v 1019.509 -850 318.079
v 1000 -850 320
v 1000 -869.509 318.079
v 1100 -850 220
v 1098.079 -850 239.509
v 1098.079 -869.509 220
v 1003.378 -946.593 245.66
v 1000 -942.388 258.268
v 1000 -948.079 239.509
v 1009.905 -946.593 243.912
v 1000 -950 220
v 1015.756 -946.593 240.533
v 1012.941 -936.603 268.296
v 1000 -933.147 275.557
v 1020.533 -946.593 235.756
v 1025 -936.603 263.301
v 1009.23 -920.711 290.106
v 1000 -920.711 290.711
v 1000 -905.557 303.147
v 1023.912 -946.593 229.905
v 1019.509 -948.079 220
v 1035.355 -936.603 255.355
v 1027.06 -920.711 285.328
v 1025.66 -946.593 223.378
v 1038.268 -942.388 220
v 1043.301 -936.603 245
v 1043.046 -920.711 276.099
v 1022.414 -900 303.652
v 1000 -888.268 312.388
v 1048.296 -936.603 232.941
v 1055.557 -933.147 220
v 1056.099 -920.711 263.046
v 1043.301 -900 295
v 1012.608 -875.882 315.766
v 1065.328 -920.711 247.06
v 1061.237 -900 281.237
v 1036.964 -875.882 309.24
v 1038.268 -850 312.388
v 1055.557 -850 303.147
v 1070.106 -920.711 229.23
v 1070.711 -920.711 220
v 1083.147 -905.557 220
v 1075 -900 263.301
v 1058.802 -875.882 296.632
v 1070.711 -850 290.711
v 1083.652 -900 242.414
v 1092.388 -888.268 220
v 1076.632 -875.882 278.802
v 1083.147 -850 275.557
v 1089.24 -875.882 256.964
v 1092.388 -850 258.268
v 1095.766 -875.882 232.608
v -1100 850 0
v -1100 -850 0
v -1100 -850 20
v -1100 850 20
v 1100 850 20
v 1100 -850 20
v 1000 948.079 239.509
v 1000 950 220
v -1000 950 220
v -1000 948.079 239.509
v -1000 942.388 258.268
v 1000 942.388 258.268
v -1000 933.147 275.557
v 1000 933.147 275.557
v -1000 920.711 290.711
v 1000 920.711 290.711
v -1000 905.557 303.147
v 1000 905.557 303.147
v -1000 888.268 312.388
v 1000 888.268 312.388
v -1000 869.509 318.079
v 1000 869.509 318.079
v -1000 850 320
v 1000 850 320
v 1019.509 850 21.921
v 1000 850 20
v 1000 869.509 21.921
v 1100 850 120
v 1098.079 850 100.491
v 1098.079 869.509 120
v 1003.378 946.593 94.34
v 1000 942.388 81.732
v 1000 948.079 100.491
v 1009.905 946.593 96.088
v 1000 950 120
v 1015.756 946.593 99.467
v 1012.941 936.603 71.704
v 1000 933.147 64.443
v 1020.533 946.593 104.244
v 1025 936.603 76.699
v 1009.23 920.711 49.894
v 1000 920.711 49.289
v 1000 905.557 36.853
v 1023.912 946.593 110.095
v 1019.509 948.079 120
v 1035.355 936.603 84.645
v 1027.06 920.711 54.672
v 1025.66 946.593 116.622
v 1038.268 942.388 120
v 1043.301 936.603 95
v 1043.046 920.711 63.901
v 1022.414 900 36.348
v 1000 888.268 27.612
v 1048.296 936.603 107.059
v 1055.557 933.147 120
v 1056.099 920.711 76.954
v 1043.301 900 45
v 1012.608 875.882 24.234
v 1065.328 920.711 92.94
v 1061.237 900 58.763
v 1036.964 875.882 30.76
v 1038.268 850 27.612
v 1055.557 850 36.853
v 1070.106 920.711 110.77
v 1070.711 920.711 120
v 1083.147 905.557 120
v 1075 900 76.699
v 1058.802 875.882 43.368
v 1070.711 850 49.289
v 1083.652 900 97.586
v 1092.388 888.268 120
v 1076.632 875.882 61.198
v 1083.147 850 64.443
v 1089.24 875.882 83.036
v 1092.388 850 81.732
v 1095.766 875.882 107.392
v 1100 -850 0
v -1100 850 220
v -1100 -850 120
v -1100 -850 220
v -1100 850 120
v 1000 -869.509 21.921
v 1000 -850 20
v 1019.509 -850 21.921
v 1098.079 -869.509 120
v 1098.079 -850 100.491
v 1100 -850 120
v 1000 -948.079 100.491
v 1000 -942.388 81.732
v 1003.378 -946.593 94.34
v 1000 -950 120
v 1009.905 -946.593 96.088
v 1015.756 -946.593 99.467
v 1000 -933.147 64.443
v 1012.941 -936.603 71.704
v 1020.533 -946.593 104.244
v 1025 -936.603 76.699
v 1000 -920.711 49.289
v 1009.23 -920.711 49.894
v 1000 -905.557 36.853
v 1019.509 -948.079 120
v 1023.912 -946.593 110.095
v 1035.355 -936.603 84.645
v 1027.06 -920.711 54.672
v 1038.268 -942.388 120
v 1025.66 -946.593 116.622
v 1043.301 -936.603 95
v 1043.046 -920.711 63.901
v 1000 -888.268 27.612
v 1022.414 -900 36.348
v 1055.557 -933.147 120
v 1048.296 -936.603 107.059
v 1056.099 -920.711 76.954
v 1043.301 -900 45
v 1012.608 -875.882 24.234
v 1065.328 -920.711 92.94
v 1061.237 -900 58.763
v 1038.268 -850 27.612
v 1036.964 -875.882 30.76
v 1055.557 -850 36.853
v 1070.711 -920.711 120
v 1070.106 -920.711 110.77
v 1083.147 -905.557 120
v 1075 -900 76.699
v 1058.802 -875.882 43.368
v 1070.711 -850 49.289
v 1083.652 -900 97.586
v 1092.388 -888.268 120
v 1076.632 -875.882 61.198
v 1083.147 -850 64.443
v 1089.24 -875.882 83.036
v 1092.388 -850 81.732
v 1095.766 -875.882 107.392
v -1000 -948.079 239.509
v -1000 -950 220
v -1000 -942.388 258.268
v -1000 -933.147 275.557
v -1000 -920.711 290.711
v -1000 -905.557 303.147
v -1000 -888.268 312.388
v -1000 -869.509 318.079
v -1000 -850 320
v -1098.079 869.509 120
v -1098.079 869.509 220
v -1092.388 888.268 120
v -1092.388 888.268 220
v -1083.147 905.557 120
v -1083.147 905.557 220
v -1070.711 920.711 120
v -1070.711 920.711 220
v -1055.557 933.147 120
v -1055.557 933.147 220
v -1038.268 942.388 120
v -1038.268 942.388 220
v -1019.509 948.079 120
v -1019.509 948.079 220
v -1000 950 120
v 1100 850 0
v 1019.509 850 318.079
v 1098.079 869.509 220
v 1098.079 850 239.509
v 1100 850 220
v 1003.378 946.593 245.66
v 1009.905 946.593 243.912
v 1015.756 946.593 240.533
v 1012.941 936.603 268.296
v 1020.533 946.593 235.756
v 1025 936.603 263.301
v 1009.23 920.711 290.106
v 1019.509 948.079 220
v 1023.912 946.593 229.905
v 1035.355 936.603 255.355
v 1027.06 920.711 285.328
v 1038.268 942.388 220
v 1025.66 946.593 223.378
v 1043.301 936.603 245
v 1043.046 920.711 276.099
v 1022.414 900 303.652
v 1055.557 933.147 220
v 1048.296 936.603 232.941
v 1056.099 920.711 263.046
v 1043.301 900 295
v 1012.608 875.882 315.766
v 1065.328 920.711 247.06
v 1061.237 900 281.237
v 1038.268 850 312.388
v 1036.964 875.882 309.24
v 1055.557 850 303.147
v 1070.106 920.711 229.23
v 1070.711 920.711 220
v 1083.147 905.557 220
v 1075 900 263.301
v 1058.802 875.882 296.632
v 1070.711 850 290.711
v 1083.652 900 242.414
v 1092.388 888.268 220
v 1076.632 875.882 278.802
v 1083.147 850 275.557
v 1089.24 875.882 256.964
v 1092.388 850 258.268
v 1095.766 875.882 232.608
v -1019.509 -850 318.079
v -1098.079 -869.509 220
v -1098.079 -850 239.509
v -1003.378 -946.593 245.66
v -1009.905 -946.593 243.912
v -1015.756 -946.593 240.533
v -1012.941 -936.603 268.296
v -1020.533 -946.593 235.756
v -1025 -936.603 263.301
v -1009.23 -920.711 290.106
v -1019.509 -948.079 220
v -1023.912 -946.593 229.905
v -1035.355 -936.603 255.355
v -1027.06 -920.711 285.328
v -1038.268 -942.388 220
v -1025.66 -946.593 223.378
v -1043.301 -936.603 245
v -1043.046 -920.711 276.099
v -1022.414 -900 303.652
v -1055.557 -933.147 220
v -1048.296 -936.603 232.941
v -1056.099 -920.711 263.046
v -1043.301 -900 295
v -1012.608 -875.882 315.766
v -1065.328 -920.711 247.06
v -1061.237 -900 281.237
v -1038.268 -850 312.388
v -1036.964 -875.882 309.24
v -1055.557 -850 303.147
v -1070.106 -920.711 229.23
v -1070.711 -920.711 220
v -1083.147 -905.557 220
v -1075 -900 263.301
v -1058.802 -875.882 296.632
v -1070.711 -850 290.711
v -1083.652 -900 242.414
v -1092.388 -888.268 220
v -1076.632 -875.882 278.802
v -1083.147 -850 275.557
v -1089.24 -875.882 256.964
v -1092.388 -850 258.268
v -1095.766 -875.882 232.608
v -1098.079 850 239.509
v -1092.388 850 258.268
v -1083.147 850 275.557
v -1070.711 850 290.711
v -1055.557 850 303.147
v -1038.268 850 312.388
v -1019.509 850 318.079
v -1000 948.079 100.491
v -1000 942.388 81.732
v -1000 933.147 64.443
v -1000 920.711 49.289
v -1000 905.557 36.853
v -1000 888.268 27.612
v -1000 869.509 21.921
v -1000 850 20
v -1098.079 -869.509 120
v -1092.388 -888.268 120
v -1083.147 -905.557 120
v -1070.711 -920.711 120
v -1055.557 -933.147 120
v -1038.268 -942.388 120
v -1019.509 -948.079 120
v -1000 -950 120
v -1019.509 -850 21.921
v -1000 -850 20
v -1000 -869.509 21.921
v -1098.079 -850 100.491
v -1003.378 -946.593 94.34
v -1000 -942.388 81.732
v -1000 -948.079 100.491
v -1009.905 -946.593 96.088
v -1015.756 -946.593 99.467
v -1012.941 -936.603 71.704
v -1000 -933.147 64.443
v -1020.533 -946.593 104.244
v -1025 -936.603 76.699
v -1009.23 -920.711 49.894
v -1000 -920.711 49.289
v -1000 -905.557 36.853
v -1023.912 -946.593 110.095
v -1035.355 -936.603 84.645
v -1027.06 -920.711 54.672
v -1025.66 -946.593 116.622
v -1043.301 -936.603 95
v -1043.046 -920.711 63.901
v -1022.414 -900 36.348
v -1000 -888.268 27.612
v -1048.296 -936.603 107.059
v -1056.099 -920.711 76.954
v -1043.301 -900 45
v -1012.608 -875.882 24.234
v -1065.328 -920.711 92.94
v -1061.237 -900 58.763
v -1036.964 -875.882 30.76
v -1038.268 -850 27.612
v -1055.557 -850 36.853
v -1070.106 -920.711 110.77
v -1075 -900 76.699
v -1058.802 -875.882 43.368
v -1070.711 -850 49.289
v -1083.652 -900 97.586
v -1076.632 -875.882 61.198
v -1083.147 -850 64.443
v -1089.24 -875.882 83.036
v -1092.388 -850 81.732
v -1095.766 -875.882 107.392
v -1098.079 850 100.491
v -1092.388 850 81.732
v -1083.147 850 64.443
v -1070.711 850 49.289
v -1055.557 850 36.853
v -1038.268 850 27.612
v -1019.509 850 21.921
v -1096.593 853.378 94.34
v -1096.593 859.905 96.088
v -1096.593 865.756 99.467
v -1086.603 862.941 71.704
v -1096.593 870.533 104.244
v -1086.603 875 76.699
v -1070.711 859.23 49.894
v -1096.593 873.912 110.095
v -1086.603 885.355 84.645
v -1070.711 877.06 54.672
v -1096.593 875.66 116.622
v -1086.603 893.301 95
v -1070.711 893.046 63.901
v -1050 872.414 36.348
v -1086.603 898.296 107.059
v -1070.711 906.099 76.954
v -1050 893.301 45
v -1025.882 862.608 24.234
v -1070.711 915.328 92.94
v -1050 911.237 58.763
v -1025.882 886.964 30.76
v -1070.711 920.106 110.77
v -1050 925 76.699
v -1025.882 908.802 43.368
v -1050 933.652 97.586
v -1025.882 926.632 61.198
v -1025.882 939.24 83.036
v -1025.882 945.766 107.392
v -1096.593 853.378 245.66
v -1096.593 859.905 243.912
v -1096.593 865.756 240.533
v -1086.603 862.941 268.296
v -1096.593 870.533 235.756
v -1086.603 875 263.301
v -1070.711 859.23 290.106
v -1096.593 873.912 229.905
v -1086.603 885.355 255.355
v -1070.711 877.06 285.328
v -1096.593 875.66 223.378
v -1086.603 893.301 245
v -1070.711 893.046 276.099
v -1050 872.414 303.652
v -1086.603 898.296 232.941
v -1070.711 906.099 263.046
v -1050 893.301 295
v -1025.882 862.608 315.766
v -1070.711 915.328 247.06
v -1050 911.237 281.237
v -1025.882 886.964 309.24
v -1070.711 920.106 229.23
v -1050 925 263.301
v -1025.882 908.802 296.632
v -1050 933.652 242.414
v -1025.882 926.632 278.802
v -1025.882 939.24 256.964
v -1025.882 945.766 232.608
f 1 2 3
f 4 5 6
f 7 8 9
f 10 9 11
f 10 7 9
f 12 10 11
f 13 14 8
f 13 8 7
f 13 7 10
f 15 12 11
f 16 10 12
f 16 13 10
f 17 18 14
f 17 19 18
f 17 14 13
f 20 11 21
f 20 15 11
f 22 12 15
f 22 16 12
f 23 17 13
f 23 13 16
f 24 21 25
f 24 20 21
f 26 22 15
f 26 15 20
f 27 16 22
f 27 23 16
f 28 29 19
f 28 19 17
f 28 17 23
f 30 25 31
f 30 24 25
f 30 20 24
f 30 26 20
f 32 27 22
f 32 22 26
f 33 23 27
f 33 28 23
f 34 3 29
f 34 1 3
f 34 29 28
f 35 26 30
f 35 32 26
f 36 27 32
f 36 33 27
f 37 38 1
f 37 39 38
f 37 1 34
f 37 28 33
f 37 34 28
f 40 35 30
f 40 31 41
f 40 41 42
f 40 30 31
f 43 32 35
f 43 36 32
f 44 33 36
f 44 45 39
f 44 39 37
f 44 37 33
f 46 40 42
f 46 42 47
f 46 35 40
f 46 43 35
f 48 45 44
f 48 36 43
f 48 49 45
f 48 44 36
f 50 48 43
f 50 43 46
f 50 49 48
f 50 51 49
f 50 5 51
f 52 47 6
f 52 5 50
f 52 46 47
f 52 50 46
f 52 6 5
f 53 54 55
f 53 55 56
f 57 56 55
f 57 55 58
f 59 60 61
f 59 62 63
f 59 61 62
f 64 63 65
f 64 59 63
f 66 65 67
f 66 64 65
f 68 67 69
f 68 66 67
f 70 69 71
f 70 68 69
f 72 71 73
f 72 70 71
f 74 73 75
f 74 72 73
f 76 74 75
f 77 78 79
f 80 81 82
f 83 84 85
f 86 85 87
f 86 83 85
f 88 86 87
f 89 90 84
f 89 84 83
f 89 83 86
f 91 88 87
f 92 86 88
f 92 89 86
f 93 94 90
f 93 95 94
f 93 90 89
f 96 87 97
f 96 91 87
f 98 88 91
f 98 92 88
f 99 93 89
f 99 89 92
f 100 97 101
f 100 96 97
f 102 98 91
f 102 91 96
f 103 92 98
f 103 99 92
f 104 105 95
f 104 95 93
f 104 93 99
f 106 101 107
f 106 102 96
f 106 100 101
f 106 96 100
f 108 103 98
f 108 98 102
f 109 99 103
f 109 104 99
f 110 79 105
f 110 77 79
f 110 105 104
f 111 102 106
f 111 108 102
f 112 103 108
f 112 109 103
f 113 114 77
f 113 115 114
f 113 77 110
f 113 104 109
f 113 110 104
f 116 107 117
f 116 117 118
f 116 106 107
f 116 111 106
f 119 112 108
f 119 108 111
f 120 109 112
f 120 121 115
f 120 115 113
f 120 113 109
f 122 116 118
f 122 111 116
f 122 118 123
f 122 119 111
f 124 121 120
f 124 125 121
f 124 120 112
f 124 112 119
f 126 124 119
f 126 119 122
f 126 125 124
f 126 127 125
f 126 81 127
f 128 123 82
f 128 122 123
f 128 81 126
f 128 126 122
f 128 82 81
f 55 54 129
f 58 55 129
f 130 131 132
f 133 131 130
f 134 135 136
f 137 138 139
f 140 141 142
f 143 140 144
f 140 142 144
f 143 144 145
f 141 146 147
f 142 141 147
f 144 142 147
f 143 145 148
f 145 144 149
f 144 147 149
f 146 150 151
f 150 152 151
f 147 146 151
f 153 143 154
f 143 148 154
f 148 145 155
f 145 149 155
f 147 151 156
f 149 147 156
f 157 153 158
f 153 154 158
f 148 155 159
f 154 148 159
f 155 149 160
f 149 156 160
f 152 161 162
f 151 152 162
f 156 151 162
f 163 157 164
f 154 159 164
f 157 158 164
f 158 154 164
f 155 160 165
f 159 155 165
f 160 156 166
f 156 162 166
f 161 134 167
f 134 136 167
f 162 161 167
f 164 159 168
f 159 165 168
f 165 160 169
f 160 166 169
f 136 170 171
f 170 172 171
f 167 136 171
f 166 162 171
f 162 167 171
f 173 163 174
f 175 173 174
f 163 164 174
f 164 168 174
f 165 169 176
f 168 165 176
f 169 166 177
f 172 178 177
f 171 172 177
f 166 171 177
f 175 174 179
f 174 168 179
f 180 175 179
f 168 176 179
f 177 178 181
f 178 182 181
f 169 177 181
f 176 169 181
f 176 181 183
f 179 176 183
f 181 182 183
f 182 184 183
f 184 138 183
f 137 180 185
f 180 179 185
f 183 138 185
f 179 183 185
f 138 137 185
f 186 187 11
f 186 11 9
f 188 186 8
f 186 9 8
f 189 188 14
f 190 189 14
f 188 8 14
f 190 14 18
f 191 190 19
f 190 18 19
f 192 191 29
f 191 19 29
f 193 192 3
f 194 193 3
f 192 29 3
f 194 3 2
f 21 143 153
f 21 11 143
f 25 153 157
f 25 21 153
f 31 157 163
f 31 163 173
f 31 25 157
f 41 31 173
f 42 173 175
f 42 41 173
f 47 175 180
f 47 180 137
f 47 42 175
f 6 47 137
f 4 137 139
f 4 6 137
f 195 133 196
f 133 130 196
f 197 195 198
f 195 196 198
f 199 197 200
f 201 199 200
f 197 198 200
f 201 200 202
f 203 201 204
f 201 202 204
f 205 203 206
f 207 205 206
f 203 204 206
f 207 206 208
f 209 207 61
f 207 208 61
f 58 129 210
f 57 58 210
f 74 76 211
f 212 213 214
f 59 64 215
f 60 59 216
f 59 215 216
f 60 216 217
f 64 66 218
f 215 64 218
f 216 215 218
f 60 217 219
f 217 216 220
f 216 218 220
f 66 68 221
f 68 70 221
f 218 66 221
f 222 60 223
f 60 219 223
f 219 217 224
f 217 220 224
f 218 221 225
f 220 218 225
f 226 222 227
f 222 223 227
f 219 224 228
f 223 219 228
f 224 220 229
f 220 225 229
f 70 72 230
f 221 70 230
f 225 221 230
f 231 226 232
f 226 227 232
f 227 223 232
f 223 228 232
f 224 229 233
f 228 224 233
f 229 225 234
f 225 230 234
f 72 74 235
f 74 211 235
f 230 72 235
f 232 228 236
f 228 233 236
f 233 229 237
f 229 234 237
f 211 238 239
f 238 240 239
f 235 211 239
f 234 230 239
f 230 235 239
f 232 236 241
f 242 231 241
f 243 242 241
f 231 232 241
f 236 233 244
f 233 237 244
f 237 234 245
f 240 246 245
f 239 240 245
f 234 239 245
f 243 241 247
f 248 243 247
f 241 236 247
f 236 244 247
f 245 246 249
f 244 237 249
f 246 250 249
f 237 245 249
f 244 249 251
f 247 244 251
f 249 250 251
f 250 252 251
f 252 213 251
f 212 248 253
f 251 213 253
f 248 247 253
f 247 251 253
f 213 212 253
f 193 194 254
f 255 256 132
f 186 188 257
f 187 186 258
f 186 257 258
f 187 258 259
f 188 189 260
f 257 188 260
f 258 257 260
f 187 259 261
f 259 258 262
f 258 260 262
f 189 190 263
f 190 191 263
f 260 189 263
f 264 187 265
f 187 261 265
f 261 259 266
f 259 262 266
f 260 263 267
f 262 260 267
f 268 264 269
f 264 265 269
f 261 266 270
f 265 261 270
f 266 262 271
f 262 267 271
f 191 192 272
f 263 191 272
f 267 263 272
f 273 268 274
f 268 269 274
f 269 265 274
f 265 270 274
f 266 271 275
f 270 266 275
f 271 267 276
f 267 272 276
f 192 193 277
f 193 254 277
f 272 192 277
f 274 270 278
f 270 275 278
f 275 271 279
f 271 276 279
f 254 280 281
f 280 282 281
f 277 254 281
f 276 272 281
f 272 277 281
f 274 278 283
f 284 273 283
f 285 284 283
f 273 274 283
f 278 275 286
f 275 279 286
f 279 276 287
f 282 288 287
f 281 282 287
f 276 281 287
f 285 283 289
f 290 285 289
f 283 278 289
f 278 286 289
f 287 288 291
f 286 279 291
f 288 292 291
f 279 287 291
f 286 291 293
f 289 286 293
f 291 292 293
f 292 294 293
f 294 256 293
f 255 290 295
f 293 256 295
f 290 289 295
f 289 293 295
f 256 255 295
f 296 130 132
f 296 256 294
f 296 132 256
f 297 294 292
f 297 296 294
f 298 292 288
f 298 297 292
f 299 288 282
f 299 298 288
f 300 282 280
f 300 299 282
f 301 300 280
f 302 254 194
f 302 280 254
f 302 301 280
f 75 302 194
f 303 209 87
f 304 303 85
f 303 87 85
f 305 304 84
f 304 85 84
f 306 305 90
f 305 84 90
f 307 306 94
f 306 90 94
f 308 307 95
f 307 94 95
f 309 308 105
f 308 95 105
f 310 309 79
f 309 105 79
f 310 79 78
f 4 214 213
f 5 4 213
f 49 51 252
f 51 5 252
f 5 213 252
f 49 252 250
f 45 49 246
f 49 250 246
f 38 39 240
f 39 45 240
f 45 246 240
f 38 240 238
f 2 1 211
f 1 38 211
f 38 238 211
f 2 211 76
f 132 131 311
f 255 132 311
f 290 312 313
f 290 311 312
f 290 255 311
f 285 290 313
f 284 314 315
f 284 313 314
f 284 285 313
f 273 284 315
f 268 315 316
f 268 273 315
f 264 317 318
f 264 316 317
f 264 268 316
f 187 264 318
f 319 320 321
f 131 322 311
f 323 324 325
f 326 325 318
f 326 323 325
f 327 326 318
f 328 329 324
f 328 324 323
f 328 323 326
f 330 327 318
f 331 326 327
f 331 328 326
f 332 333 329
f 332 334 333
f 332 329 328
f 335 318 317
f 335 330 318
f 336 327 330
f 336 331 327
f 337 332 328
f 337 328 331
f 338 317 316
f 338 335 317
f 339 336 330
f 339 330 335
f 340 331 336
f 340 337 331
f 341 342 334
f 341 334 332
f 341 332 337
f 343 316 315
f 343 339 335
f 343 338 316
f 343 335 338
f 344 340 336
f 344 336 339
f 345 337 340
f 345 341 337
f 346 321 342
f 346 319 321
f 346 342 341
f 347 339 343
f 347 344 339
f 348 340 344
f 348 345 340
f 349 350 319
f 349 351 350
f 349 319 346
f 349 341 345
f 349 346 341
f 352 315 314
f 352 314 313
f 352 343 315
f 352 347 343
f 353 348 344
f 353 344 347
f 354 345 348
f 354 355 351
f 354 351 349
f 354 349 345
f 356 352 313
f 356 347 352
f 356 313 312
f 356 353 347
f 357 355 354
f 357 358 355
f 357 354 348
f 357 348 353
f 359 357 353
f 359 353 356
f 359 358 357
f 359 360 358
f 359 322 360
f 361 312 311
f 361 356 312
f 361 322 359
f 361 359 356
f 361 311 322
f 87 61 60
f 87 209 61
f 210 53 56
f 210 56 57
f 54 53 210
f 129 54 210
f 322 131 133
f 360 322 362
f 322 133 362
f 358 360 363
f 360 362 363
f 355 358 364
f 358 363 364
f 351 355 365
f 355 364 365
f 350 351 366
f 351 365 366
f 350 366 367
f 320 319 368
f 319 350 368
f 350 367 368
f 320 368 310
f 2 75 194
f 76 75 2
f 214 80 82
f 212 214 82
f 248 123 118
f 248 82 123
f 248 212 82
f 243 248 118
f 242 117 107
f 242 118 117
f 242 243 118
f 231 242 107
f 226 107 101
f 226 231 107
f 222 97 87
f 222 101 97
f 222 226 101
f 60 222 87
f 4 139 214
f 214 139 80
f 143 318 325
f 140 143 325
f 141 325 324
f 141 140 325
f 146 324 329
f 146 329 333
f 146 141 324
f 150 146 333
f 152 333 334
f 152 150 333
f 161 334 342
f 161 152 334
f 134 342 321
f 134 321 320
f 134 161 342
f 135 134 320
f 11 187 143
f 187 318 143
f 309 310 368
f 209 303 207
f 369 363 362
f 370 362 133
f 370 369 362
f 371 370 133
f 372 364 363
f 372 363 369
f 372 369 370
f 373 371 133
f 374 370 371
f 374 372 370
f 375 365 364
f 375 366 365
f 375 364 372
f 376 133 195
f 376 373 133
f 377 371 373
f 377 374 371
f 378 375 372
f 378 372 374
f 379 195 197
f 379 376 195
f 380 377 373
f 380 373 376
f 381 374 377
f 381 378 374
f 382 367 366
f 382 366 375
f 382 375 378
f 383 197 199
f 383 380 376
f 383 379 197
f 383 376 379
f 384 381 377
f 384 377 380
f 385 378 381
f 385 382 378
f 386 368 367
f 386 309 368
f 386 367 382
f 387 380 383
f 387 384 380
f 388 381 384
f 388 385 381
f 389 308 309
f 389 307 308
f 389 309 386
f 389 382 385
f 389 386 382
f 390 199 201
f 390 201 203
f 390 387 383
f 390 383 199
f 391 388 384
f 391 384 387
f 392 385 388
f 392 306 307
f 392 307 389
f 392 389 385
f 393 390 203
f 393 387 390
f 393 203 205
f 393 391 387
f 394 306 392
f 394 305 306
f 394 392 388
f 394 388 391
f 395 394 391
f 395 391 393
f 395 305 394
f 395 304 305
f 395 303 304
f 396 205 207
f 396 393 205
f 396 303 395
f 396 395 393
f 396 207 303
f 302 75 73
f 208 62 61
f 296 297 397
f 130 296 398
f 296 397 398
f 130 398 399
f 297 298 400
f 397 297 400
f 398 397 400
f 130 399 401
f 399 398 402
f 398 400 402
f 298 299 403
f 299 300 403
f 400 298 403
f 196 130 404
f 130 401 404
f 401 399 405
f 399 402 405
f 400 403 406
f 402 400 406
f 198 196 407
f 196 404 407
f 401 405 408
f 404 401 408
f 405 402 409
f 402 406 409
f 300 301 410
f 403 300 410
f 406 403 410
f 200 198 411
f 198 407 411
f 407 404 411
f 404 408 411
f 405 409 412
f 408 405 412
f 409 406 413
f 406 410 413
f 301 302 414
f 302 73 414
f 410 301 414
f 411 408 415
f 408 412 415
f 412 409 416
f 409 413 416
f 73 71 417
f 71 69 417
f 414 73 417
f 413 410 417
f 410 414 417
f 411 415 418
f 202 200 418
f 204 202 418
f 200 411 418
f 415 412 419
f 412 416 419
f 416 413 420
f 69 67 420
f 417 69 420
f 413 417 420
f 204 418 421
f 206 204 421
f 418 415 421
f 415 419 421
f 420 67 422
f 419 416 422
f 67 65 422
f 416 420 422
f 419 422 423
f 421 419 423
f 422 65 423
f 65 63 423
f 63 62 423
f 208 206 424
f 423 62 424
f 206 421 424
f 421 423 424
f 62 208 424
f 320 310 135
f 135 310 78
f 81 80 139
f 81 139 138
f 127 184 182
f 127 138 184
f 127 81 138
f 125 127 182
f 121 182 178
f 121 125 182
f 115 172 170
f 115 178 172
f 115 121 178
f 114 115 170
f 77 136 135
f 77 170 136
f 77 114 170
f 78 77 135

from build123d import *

# Parameters (mm, degrees)
F0_W     = 2200
F0_H     = 1700
F1_DEPTH = 20
F2_W     = 2200
F2_H     = 1900
F3_DEPTH = 300
F4_R     = 100


with BuildPart() as f1:
    # F0 (on Top) → F1 (new body)
    with BuildSketch(Plane.XY):
        Rectangle(F0_W, F0_H)
    extrude(amount=F1_DEPTH)


with BuildPart() as f3:
    # F2 (on face) → F3 (new body)
    with BuildSketch(Plane.XY.offset(20)):
        Rectangle(F2_W, F2_H)
    extrude(amount=F3_DEPTH)

    # F4
    f4_edges = [f3.edges().sort_by_distance(p)[0] for p in [
        (1100, 0, 320),
        (0, 950, 320),
        (-1100, 0, 320),
        (0, -950, 320),
        (1100, 0, 20),
        (0, 950, 20),
        (-1100, 0, 20),
        (0, -950, 20),
        (1100, -950, 170),
        (1100, 950, 170),
        (-1100, 950, 170),
        (-1100, -950, 170),
    ]]
    fillet(f4_edges, radius=F4_R)


solid = Compound([f1.part, f3.part])
